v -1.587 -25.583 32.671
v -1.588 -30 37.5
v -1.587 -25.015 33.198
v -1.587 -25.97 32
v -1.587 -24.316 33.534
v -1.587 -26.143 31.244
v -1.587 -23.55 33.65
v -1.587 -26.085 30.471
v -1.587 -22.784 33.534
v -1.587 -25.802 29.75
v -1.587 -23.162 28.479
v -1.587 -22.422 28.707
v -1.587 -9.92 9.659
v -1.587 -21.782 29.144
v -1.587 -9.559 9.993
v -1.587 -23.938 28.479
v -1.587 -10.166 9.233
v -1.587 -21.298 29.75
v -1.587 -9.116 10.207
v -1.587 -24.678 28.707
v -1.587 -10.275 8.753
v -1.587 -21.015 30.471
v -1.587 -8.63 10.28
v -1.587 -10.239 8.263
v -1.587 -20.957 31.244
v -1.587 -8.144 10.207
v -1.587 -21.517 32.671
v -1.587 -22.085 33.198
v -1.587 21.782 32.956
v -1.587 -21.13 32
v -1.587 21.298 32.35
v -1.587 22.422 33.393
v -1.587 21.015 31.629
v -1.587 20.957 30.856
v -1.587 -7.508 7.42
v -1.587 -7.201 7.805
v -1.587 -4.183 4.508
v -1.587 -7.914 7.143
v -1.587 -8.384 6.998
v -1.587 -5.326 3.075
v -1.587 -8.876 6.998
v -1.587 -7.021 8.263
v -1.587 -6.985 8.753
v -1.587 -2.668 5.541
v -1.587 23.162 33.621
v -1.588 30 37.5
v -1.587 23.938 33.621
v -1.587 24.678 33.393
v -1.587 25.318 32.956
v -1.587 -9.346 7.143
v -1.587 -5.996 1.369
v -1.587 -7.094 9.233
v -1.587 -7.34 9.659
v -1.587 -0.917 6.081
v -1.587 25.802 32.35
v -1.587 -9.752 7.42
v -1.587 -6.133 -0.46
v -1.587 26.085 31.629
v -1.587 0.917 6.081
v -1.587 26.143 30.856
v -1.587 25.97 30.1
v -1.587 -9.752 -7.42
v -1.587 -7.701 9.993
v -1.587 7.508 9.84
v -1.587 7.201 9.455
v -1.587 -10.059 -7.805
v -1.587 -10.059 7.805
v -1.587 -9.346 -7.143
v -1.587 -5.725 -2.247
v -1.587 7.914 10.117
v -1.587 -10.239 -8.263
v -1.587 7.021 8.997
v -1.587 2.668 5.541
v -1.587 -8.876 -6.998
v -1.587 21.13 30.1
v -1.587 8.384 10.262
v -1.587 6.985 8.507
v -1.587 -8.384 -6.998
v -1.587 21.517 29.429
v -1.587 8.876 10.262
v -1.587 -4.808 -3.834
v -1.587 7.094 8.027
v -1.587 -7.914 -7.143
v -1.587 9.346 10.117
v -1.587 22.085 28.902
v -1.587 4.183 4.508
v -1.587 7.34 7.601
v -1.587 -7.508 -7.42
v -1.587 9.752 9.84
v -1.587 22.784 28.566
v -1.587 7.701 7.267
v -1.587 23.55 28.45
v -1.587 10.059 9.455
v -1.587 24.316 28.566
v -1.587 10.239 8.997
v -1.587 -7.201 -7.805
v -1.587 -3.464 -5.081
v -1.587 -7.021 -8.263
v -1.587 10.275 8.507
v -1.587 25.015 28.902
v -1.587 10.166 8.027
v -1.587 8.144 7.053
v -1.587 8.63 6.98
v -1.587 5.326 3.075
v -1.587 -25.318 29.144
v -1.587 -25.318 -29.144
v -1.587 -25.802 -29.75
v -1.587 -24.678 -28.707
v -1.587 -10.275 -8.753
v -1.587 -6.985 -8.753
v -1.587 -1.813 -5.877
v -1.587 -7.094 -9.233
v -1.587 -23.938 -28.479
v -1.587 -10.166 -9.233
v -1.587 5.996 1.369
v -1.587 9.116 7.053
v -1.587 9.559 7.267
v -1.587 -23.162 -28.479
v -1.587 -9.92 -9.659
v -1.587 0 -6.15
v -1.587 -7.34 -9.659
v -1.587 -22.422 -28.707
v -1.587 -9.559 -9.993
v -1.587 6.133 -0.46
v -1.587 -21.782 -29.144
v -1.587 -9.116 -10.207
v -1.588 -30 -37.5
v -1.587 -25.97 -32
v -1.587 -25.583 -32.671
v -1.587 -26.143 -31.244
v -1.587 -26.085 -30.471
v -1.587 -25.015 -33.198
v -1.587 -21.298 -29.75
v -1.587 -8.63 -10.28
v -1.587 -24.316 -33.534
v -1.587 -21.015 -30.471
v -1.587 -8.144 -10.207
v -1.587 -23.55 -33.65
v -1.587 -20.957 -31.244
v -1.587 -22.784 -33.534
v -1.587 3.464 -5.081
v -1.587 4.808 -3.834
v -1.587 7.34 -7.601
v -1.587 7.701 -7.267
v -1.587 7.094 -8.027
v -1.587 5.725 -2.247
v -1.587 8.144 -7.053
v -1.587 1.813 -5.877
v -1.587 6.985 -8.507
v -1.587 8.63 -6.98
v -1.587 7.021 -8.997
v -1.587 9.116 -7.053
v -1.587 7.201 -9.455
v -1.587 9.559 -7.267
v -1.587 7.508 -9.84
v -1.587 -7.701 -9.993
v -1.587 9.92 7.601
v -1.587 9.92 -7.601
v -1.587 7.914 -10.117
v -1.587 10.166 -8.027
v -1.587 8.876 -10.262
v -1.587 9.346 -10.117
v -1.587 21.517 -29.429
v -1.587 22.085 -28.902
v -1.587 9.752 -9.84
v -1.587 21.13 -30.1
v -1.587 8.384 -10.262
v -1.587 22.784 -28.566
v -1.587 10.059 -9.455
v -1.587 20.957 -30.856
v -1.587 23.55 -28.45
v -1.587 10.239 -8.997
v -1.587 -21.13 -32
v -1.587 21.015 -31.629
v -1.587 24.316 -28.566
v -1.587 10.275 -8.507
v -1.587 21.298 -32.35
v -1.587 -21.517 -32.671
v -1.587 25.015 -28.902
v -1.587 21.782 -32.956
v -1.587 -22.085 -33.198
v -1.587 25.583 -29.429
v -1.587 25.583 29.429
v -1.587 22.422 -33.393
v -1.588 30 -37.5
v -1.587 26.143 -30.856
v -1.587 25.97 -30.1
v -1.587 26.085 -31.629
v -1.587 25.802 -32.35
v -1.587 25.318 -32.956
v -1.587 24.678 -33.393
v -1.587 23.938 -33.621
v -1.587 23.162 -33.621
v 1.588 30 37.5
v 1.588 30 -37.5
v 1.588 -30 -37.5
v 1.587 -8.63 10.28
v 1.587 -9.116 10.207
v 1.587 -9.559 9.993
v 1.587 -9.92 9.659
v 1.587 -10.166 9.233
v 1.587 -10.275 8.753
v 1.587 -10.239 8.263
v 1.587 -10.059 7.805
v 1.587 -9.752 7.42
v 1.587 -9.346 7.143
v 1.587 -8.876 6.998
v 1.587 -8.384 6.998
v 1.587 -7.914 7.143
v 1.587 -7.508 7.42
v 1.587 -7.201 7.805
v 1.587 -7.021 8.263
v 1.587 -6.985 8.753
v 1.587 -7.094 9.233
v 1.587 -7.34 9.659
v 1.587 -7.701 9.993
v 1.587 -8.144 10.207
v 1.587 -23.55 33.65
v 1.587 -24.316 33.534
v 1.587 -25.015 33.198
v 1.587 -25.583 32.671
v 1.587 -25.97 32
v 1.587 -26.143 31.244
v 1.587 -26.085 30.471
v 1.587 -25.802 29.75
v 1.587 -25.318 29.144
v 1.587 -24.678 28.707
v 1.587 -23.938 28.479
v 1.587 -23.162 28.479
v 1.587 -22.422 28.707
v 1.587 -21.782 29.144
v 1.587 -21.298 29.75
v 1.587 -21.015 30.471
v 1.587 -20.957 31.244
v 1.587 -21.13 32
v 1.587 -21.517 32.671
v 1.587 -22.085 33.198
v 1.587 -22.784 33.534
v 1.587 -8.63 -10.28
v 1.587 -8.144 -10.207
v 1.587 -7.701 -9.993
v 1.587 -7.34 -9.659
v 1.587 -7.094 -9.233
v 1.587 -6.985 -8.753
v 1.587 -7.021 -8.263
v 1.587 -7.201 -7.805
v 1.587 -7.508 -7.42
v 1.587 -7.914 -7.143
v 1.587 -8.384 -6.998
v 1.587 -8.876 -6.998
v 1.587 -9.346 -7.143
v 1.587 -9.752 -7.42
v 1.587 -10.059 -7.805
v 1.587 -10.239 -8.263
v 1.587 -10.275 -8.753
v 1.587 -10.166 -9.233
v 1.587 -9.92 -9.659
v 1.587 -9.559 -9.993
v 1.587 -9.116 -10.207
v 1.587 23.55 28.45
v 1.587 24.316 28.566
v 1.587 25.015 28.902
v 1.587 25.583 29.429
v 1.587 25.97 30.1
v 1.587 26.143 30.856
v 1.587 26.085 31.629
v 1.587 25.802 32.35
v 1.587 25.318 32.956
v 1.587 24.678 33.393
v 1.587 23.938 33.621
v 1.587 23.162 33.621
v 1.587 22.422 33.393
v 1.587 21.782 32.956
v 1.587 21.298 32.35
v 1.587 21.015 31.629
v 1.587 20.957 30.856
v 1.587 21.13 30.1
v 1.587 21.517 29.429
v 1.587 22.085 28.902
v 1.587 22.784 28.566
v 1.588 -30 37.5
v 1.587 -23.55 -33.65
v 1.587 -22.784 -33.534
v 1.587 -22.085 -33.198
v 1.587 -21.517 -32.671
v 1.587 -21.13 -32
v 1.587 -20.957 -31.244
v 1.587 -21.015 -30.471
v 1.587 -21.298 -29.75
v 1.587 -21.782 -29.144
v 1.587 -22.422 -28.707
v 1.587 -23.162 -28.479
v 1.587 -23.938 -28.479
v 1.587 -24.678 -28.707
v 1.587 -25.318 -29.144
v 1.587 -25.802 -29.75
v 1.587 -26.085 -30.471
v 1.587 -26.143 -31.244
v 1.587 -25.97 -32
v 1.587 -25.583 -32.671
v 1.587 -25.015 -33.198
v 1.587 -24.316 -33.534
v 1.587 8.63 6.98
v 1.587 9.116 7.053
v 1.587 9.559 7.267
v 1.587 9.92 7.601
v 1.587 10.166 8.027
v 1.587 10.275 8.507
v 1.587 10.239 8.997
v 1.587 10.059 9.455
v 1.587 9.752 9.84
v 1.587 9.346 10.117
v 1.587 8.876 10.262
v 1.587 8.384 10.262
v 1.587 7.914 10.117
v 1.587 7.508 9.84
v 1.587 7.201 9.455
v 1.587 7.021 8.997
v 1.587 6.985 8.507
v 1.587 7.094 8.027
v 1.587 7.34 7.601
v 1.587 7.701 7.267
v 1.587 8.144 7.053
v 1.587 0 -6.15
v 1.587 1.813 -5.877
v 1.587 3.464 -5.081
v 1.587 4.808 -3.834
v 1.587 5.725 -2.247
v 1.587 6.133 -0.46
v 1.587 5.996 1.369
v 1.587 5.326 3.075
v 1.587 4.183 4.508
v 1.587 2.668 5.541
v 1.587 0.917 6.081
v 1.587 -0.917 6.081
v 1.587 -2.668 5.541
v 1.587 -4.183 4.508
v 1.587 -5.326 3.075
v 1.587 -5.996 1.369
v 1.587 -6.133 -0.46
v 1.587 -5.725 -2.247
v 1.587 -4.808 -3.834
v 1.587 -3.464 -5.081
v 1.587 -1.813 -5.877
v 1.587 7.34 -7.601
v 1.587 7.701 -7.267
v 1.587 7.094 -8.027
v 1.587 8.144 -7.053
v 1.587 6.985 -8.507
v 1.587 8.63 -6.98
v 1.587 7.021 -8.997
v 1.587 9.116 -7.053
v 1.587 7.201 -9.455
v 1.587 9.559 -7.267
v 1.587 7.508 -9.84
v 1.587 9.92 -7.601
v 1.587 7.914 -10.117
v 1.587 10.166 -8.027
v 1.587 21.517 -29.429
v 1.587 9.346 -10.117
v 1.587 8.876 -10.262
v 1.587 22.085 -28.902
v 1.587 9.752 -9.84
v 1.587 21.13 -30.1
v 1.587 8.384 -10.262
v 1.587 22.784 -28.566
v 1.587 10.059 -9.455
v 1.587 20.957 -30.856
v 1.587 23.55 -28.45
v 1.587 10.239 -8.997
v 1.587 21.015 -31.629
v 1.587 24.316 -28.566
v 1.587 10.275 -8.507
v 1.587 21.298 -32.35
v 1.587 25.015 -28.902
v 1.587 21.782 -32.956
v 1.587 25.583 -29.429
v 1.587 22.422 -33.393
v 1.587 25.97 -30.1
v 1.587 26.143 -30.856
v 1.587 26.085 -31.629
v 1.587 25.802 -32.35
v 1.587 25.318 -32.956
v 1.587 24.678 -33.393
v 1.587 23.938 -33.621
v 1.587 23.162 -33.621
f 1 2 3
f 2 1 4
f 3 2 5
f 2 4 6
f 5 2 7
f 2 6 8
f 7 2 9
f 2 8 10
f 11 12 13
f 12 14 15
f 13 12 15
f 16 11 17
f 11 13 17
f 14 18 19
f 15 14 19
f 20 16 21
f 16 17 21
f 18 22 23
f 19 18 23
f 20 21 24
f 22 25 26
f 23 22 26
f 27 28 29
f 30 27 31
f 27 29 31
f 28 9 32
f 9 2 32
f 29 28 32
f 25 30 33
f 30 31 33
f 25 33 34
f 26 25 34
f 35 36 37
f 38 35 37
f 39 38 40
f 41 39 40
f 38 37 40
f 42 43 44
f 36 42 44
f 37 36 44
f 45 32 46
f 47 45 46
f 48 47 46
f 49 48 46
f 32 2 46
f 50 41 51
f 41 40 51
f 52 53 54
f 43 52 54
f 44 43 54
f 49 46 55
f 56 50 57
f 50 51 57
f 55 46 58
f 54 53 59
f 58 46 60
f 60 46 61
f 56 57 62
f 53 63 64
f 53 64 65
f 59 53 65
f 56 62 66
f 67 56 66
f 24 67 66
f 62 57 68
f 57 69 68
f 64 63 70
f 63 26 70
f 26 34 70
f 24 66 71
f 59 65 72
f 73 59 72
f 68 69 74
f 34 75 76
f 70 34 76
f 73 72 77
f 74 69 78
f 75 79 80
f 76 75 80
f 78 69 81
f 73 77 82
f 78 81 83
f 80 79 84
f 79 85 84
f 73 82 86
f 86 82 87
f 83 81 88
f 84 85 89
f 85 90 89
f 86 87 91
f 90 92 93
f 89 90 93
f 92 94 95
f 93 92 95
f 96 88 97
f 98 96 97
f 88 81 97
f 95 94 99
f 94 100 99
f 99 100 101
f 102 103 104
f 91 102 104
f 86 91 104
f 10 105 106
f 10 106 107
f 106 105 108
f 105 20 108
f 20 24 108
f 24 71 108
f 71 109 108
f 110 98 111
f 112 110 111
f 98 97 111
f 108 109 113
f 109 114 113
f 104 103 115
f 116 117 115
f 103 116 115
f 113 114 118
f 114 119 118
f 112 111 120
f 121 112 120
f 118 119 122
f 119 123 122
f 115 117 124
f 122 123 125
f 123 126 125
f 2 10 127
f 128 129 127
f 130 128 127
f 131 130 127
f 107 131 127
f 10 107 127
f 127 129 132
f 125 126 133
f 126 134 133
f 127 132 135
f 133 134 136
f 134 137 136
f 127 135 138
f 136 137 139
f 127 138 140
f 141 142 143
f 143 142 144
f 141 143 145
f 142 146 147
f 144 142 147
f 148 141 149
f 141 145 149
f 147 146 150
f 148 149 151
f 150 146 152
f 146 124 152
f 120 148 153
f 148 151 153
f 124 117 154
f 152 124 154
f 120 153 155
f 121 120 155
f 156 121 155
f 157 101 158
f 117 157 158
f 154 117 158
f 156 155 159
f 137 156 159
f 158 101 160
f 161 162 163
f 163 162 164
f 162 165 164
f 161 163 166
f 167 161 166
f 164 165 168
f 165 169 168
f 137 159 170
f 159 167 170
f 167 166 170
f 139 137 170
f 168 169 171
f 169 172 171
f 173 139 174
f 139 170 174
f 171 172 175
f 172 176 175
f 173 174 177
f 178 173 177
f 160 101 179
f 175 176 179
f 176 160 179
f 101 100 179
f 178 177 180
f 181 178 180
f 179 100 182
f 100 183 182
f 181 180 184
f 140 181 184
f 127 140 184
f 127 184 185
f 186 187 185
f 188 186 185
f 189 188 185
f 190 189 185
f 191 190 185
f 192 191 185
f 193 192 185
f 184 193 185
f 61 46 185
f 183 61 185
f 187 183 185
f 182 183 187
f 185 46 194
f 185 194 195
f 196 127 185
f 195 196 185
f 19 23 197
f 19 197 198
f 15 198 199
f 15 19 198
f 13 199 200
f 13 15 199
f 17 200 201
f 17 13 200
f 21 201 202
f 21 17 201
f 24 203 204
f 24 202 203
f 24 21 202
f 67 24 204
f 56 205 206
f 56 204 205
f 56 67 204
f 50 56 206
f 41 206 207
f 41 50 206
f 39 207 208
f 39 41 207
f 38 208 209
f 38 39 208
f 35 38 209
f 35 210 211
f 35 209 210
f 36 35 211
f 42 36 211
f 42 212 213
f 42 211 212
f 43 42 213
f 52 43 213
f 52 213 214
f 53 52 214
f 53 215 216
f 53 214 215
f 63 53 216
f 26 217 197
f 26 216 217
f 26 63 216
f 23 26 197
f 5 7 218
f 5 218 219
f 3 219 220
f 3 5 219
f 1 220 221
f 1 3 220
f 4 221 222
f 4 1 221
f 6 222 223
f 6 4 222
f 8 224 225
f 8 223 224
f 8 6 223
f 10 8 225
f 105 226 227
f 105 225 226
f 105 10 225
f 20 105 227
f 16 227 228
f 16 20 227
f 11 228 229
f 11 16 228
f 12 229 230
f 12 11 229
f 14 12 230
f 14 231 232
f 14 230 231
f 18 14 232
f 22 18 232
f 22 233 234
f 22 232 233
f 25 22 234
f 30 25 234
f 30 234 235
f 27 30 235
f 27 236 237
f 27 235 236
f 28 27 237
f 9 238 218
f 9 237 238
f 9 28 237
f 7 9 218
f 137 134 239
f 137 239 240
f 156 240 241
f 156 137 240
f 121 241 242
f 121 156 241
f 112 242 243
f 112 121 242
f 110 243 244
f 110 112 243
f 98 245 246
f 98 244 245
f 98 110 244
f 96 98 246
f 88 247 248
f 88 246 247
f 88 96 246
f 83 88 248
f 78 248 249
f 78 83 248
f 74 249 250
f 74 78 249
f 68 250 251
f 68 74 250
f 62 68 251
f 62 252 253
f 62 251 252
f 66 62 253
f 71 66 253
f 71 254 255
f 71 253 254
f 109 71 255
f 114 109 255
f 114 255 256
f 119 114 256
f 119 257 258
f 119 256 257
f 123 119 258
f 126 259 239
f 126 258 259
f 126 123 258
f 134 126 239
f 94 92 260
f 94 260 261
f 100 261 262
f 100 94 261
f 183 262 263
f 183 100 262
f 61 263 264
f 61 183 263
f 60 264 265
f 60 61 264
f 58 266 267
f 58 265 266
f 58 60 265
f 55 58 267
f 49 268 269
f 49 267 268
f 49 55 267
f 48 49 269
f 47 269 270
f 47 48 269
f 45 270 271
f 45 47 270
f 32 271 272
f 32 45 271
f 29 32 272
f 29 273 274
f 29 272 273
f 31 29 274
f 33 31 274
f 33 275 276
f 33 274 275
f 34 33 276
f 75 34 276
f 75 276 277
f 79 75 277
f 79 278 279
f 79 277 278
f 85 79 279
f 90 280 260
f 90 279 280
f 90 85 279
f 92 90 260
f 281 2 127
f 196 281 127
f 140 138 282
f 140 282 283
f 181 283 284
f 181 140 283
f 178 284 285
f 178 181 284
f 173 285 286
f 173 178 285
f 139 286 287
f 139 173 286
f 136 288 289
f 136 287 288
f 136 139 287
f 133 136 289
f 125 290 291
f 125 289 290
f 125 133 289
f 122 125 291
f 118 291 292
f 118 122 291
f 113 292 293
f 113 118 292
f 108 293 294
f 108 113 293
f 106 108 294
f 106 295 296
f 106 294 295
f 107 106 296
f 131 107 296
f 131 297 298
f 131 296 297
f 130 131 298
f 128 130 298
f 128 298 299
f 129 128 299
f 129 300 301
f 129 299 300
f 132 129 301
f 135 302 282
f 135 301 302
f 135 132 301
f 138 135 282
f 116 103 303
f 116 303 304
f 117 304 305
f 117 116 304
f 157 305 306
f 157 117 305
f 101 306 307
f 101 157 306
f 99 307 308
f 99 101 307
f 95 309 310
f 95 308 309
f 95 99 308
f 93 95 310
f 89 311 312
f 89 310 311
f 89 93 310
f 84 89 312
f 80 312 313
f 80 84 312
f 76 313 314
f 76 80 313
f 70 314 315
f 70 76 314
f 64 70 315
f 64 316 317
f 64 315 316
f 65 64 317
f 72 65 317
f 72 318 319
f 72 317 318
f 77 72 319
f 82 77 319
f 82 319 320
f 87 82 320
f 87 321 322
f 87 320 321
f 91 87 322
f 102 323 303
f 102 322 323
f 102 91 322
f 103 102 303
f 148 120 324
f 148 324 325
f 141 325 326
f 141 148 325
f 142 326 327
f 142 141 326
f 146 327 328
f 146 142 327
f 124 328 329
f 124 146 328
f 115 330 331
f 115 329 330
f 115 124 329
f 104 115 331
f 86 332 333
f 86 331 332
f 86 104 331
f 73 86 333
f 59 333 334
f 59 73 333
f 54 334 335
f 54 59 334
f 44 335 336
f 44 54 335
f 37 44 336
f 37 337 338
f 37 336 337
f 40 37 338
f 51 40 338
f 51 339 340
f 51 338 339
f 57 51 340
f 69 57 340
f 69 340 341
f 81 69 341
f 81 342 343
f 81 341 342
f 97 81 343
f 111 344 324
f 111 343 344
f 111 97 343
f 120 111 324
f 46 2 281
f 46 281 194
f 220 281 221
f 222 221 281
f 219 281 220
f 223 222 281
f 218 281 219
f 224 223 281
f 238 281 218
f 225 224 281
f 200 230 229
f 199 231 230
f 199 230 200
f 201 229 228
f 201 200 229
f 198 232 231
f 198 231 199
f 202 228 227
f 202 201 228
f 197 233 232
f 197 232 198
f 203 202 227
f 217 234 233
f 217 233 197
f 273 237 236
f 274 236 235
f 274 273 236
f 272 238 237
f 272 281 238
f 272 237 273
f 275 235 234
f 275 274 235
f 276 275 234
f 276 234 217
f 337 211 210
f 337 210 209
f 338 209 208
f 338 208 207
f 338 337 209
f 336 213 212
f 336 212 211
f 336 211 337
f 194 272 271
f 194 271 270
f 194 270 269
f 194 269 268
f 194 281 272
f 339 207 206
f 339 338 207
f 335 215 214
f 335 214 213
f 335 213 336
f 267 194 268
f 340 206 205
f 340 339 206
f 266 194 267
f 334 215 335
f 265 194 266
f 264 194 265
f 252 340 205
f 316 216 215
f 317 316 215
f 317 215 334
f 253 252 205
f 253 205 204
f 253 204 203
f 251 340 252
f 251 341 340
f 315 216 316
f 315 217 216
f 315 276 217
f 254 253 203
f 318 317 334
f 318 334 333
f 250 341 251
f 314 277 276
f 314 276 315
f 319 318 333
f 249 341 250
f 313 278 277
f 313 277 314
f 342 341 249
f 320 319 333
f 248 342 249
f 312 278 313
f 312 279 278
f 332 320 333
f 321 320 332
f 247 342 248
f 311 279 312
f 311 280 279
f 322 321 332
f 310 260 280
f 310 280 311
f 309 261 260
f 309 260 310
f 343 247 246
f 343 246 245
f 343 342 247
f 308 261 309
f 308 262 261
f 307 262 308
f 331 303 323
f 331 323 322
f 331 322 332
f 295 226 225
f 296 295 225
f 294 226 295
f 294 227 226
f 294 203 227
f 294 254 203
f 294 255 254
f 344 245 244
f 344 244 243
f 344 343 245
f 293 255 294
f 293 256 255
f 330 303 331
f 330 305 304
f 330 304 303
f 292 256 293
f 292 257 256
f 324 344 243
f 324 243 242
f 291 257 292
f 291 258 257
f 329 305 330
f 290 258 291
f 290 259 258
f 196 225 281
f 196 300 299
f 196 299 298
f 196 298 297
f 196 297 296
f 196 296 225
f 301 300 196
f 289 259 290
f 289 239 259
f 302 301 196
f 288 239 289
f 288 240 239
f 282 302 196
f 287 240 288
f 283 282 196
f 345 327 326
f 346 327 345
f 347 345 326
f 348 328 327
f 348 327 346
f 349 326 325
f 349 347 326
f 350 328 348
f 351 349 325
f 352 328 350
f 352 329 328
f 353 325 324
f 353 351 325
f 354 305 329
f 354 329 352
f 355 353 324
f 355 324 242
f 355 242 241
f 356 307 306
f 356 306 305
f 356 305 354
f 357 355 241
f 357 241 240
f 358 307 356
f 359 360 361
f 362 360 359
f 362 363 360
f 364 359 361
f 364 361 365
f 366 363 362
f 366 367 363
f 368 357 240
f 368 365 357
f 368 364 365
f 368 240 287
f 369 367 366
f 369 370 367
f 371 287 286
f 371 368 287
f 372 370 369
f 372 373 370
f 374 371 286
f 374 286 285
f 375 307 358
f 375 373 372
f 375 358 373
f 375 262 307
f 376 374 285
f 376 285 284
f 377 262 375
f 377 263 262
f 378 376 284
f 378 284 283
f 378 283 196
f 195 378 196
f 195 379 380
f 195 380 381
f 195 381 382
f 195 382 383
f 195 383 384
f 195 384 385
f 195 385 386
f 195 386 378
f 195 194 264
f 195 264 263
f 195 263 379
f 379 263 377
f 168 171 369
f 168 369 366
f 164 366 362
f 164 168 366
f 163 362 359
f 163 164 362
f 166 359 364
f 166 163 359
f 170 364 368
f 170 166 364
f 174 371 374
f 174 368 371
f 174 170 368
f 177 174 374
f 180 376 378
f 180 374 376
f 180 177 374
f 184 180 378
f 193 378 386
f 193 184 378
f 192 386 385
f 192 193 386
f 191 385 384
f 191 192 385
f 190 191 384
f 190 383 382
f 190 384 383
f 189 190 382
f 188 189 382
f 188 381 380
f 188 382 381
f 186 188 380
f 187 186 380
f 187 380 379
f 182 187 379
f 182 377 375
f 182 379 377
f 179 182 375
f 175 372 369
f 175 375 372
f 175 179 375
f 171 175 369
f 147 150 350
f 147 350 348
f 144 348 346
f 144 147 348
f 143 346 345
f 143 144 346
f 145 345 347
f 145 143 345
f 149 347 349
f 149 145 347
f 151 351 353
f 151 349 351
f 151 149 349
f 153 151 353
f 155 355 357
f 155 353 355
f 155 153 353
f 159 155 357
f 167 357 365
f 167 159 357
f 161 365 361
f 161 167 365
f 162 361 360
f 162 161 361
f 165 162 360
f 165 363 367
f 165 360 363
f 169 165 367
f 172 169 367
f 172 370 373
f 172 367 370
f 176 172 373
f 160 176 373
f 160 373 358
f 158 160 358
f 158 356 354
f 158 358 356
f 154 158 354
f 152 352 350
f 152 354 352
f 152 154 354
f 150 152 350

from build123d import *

# Parameters (mm, degrees)
BOSS_EXTRUDE1_DEPTH      = 1.5875
BOSS_EXTRUDE1_DEPTH_BACK = 1.5875
SKETCH1_W                = 75
SKETCH1_H                = 60
CUT_EXTRUDE1_DEPTH       = 49.049663435
CUT_EXTRUDE1_DEPTH_BACK  = 49.049663435
SKETCH2_R                = 2.6
CUT_EXTRUDE2_DEPTH       = 49.049663435
CUT_EXTRUDE2_DEPTH_BACK  = 49.049663435
SKETCH3_R                = 6.15
SKETCH3_R_2              = 1.65


with BuildPart() as part:
    # Sketch1 → Boss-Extrude1 (new, two sides: drawn at the far end of the back side and taken through both)
    with BuildSketch(Plane(origin=(0, 0, 0), x_dir=(0, 0, -1), z_dir=(1, 0, 0)).offset(-BOSS_EXTRUDE1_DEPTH_BACK)):
        Rectangle(SKETCH1_W, SKETCH1_H)
    extrude(amount=BOSS_EXTRUDE1_DEPTH + BOSS_EXTRUDE1_DEPTH_BACK)

    # Sketch2 → Cut-Extrude1 (cut, two sides: drawn at the far end of the back side and taken through both)
    with BuildSketch(Plane(origin=(0, 0, 0), x_dir=(0, 0, -1), z_dir=(1, 0, 0)).offset(-CUT_EXTRUDE1_DEPTH_BACK)):
        with Locations((-31.05, 23.55)):
            Circle(SKETCH2_R)
        with Locations((31.05, 23.55)):
            Circle(SKETCH2_R)
        with Locations((31.05, -23.55)):
            Circle(SKETCH2_R)
        with Locations((-31.05, -23.55)):
            Circle(SKETCH2_R)
    extrude(amount=CUT_EXTRUDE1_DEPTH + CUT_EXTRUDE1_DEPTH_BACK, mode=Mode.SUBTRACT)

    # Sketch3 → Cut-Extrude2 (cut, two sides: drawn at the far end of the back side and taken through both)
    with BuildSketch(Plane(origin=(0, 0, 0), x_dir=(0, 0, -1), z_dir=(1, 0, 0)).offset(-CUT_EXTRUDE2_DEPTH_BACK)):
        Circle(SKETCH3_R)
        with Locations((-8.63, 8.63)):
            Circle(SKETCH3_R_2)
        with Locations((-8.63, -8.63)):
            Circle(SKETCH3_R_2)
        with Locations((8.63, -8.63)):
            Circle(SKETCH3_R_2)
        with Locations((8.63, 8.63)):
            Circle(SKETCH3_R_2)
    extrude(amount=CUT_EXTRUDE2_DEPTH + CUT_EXTRUDE2_DEPTH_BACK, mode=Mode.SUBTRACT)


solid = part.part
